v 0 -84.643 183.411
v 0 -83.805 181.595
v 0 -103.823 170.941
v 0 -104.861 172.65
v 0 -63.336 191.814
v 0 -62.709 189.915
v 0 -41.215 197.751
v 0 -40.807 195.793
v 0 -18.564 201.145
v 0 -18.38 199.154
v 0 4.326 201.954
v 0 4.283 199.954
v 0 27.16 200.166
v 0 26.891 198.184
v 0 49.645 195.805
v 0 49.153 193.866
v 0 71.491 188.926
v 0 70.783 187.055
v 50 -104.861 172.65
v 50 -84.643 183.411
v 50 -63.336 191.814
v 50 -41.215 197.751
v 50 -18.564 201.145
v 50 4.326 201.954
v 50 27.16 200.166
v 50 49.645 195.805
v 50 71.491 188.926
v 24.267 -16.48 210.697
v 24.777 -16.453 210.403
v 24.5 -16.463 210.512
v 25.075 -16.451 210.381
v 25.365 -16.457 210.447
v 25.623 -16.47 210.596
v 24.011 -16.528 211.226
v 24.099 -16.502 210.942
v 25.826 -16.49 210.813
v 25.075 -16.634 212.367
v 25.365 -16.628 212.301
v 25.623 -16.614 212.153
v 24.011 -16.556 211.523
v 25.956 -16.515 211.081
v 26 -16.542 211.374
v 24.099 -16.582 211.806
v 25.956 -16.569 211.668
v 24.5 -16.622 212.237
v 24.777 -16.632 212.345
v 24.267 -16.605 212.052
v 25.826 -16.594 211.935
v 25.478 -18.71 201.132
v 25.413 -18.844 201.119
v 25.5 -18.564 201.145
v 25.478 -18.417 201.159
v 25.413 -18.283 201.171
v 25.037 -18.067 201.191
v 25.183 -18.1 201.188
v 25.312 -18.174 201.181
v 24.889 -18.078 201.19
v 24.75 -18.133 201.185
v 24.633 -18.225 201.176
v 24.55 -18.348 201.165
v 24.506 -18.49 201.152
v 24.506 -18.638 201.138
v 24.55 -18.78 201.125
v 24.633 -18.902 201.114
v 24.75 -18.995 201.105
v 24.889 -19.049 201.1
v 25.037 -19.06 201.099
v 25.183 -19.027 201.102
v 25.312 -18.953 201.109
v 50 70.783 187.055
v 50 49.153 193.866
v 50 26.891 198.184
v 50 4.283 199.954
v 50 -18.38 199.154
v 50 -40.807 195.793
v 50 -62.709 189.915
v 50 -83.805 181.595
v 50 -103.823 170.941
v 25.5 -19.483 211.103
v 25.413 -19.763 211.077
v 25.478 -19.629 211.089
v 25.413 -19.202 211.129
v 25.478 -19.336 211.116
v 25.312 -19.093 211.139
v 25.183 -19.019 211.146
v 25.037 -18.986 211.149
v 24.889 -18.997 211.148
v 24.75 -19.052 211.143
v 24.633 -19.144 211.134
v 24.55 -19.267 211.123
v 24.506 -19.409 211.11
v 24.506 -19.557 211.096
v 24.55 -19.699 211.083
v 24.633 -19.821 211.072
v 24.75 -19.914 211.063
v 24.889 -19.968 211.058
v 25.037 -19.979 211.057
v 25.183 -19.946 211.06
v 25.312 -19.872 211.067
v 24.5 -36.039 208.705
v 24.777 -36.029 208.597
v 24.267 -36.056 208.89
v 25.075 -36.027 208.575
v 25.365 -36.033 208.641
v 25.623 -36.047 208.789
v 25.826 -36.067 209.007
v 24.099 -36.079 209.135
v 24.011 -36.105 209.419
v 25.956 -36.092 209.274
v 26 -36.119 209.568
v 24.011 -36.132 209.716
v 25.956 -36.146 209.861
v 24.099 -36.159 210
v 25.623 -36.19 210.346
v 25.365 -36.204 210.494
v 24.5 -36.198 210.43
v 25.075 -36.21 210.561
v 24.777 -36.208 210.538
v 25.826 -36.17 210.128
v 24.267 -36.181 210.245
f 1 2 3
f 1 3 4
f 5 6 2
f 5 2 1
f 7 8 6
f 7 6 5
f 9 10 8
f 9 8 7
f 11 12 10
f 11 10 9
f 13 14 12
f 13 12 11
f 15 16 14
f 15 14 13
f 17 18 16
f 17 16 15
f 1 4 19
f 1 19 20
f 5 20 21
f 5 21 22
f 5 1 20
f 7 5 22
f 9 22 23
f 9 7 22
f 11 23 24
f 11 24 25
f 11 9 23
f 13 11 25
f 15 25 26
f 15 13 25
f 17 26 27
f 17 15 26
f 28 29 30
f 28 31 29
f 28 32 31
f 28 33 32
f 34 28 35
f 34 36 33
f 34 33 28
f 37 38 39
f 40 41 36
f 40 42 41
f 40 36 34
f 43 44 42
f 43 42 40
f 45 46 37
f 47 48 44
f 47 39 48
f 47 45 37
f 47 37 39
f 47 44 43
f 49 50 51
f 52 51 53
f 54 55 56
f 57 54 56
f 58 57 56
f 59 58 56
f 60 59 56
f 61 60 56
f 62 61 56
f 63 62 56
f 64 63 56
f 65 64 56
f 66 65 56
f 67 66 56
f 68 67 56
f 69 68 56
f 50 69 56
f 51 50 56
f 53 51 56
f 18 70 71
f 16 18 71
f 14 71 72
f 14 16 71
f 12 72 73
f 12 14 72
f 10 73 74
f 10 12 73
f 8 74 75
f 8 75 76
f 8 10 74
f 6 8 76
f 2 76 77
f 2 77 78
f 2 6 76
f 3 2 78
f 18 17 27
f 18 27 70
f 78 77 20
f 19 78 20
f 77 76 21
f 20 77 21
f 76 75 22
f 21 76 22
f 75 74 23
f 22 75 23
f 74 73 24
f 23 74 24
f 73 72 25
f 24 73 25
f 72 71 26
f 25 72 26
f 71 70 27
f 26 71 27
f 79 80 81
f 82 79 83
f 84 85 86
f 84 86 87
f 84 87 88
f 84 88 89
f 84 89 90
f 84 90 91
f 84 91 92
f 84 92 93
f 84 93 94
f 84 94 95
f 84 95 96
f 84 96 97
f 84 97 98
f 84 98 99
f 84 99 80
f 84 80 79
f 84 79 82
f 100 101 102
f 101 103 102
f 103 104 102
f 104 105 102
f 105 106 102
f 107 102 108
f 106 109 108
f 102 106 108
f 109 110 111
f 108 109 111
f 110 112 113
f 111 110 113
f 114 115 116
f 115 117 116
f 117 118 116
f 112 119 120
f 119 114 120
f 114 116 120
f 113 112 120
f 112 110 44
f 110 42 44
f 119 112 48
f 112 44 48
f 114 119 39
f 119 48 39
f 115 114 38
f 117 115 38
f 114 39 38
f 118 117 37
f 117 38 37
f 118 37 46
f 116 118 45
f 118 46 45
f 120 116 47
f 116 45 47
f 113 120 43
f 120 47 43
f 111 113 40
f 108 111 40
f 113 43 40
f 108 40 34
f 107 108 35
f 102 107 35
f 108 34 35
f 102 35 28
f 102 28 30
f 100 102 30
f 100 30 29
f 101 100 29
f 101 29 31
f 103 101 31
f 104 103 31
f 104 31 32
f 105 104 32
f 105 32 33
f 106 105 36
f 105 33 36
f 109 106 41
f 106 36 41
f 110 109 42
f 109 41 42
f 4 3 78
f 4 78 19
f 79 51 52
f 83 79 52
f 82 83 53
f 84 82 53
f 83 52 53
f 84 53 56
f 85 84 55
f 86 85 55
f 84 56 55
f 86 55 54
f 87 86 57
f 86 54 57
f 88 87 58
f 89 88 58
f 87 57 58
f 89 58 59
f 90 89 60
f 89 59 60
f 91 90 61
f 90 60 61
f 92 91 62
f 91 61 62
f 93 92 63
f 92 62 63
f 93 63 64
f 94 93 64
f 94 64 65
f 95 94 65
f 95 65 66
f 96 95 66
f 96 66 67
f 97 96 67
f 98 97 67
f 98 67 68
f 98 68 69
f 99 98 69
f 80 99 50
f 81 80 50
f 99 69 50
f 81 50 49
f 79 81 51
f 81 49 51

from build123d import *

# Parameters (mm, degrees)
BOSS_EXTRUDE1_DEPTH = 50
SKETCH2_R           = 0.5
BOSS_EXTRUDE2_DEPTH = 10
SKETCH3_W           = 1
SKETCH3_H           = 19.659655446


with BuildPart() as part:
    # Sketch1 → Boss-Extrude1 (new body)
    with BuildSketch(Plane(origin=(0, 0, 0), x_dir=(0, 0, -1), z_dir=(1, 0, 0))):
        with BuildLine():
            Line((-188.92590538, 71.491274126), (-187.055351862, 70.783439729))
            ThreePointArc((-187.055351862, 70.783439729), (-199.153654229, -18.379934904), (-170.940885579, -103.822991854))
            Line((-170.940885579, -103.822991854), (-172.650294434, -104.861221773))
            ThreePointArc((-172.650294434, -104.861221773), (-201.145190772, -18.563734253), (-188.92590538, 71.491274126))
        make_face()
    extrude(amount=BOSS_EXTRUDE1_DEPTH)


with BuildPart() as body_2:
    # Sketch2 → Boss-Extrude2 (new body)
    with BuildSketch(Plane(origin=(0, -18.563734253, 201.145190772), x_dir=(1, 0, 0), z_dir=(0, -0.091899675, 0.995768271))):
        with Locations((25, 0)):
            Circle(SKETCH2_R)
    extrude(amount=BOSS_EXTRUDE2_DEPTH)


with BuildPart() as body_3:
    # Sketch3 → Revolve1 (revolve)
    with BuildSketch(Plane(origin=(0, -19.482730998, 211.102873483), x_dir=(1, 0, 0), z_dir=(0, -0.091899675, 0.995768271))):
        with Locations((25.5, -6.876765449)):
            Rectangle(SKETCH3_W, SKETCH3_H)
    revolve(axis=Axis((25, -16.542165283, 211.374258945), (0, -0.995768271, -0.091899675)))


solid = Compound([part.part, body_2.part, body_3.part])
